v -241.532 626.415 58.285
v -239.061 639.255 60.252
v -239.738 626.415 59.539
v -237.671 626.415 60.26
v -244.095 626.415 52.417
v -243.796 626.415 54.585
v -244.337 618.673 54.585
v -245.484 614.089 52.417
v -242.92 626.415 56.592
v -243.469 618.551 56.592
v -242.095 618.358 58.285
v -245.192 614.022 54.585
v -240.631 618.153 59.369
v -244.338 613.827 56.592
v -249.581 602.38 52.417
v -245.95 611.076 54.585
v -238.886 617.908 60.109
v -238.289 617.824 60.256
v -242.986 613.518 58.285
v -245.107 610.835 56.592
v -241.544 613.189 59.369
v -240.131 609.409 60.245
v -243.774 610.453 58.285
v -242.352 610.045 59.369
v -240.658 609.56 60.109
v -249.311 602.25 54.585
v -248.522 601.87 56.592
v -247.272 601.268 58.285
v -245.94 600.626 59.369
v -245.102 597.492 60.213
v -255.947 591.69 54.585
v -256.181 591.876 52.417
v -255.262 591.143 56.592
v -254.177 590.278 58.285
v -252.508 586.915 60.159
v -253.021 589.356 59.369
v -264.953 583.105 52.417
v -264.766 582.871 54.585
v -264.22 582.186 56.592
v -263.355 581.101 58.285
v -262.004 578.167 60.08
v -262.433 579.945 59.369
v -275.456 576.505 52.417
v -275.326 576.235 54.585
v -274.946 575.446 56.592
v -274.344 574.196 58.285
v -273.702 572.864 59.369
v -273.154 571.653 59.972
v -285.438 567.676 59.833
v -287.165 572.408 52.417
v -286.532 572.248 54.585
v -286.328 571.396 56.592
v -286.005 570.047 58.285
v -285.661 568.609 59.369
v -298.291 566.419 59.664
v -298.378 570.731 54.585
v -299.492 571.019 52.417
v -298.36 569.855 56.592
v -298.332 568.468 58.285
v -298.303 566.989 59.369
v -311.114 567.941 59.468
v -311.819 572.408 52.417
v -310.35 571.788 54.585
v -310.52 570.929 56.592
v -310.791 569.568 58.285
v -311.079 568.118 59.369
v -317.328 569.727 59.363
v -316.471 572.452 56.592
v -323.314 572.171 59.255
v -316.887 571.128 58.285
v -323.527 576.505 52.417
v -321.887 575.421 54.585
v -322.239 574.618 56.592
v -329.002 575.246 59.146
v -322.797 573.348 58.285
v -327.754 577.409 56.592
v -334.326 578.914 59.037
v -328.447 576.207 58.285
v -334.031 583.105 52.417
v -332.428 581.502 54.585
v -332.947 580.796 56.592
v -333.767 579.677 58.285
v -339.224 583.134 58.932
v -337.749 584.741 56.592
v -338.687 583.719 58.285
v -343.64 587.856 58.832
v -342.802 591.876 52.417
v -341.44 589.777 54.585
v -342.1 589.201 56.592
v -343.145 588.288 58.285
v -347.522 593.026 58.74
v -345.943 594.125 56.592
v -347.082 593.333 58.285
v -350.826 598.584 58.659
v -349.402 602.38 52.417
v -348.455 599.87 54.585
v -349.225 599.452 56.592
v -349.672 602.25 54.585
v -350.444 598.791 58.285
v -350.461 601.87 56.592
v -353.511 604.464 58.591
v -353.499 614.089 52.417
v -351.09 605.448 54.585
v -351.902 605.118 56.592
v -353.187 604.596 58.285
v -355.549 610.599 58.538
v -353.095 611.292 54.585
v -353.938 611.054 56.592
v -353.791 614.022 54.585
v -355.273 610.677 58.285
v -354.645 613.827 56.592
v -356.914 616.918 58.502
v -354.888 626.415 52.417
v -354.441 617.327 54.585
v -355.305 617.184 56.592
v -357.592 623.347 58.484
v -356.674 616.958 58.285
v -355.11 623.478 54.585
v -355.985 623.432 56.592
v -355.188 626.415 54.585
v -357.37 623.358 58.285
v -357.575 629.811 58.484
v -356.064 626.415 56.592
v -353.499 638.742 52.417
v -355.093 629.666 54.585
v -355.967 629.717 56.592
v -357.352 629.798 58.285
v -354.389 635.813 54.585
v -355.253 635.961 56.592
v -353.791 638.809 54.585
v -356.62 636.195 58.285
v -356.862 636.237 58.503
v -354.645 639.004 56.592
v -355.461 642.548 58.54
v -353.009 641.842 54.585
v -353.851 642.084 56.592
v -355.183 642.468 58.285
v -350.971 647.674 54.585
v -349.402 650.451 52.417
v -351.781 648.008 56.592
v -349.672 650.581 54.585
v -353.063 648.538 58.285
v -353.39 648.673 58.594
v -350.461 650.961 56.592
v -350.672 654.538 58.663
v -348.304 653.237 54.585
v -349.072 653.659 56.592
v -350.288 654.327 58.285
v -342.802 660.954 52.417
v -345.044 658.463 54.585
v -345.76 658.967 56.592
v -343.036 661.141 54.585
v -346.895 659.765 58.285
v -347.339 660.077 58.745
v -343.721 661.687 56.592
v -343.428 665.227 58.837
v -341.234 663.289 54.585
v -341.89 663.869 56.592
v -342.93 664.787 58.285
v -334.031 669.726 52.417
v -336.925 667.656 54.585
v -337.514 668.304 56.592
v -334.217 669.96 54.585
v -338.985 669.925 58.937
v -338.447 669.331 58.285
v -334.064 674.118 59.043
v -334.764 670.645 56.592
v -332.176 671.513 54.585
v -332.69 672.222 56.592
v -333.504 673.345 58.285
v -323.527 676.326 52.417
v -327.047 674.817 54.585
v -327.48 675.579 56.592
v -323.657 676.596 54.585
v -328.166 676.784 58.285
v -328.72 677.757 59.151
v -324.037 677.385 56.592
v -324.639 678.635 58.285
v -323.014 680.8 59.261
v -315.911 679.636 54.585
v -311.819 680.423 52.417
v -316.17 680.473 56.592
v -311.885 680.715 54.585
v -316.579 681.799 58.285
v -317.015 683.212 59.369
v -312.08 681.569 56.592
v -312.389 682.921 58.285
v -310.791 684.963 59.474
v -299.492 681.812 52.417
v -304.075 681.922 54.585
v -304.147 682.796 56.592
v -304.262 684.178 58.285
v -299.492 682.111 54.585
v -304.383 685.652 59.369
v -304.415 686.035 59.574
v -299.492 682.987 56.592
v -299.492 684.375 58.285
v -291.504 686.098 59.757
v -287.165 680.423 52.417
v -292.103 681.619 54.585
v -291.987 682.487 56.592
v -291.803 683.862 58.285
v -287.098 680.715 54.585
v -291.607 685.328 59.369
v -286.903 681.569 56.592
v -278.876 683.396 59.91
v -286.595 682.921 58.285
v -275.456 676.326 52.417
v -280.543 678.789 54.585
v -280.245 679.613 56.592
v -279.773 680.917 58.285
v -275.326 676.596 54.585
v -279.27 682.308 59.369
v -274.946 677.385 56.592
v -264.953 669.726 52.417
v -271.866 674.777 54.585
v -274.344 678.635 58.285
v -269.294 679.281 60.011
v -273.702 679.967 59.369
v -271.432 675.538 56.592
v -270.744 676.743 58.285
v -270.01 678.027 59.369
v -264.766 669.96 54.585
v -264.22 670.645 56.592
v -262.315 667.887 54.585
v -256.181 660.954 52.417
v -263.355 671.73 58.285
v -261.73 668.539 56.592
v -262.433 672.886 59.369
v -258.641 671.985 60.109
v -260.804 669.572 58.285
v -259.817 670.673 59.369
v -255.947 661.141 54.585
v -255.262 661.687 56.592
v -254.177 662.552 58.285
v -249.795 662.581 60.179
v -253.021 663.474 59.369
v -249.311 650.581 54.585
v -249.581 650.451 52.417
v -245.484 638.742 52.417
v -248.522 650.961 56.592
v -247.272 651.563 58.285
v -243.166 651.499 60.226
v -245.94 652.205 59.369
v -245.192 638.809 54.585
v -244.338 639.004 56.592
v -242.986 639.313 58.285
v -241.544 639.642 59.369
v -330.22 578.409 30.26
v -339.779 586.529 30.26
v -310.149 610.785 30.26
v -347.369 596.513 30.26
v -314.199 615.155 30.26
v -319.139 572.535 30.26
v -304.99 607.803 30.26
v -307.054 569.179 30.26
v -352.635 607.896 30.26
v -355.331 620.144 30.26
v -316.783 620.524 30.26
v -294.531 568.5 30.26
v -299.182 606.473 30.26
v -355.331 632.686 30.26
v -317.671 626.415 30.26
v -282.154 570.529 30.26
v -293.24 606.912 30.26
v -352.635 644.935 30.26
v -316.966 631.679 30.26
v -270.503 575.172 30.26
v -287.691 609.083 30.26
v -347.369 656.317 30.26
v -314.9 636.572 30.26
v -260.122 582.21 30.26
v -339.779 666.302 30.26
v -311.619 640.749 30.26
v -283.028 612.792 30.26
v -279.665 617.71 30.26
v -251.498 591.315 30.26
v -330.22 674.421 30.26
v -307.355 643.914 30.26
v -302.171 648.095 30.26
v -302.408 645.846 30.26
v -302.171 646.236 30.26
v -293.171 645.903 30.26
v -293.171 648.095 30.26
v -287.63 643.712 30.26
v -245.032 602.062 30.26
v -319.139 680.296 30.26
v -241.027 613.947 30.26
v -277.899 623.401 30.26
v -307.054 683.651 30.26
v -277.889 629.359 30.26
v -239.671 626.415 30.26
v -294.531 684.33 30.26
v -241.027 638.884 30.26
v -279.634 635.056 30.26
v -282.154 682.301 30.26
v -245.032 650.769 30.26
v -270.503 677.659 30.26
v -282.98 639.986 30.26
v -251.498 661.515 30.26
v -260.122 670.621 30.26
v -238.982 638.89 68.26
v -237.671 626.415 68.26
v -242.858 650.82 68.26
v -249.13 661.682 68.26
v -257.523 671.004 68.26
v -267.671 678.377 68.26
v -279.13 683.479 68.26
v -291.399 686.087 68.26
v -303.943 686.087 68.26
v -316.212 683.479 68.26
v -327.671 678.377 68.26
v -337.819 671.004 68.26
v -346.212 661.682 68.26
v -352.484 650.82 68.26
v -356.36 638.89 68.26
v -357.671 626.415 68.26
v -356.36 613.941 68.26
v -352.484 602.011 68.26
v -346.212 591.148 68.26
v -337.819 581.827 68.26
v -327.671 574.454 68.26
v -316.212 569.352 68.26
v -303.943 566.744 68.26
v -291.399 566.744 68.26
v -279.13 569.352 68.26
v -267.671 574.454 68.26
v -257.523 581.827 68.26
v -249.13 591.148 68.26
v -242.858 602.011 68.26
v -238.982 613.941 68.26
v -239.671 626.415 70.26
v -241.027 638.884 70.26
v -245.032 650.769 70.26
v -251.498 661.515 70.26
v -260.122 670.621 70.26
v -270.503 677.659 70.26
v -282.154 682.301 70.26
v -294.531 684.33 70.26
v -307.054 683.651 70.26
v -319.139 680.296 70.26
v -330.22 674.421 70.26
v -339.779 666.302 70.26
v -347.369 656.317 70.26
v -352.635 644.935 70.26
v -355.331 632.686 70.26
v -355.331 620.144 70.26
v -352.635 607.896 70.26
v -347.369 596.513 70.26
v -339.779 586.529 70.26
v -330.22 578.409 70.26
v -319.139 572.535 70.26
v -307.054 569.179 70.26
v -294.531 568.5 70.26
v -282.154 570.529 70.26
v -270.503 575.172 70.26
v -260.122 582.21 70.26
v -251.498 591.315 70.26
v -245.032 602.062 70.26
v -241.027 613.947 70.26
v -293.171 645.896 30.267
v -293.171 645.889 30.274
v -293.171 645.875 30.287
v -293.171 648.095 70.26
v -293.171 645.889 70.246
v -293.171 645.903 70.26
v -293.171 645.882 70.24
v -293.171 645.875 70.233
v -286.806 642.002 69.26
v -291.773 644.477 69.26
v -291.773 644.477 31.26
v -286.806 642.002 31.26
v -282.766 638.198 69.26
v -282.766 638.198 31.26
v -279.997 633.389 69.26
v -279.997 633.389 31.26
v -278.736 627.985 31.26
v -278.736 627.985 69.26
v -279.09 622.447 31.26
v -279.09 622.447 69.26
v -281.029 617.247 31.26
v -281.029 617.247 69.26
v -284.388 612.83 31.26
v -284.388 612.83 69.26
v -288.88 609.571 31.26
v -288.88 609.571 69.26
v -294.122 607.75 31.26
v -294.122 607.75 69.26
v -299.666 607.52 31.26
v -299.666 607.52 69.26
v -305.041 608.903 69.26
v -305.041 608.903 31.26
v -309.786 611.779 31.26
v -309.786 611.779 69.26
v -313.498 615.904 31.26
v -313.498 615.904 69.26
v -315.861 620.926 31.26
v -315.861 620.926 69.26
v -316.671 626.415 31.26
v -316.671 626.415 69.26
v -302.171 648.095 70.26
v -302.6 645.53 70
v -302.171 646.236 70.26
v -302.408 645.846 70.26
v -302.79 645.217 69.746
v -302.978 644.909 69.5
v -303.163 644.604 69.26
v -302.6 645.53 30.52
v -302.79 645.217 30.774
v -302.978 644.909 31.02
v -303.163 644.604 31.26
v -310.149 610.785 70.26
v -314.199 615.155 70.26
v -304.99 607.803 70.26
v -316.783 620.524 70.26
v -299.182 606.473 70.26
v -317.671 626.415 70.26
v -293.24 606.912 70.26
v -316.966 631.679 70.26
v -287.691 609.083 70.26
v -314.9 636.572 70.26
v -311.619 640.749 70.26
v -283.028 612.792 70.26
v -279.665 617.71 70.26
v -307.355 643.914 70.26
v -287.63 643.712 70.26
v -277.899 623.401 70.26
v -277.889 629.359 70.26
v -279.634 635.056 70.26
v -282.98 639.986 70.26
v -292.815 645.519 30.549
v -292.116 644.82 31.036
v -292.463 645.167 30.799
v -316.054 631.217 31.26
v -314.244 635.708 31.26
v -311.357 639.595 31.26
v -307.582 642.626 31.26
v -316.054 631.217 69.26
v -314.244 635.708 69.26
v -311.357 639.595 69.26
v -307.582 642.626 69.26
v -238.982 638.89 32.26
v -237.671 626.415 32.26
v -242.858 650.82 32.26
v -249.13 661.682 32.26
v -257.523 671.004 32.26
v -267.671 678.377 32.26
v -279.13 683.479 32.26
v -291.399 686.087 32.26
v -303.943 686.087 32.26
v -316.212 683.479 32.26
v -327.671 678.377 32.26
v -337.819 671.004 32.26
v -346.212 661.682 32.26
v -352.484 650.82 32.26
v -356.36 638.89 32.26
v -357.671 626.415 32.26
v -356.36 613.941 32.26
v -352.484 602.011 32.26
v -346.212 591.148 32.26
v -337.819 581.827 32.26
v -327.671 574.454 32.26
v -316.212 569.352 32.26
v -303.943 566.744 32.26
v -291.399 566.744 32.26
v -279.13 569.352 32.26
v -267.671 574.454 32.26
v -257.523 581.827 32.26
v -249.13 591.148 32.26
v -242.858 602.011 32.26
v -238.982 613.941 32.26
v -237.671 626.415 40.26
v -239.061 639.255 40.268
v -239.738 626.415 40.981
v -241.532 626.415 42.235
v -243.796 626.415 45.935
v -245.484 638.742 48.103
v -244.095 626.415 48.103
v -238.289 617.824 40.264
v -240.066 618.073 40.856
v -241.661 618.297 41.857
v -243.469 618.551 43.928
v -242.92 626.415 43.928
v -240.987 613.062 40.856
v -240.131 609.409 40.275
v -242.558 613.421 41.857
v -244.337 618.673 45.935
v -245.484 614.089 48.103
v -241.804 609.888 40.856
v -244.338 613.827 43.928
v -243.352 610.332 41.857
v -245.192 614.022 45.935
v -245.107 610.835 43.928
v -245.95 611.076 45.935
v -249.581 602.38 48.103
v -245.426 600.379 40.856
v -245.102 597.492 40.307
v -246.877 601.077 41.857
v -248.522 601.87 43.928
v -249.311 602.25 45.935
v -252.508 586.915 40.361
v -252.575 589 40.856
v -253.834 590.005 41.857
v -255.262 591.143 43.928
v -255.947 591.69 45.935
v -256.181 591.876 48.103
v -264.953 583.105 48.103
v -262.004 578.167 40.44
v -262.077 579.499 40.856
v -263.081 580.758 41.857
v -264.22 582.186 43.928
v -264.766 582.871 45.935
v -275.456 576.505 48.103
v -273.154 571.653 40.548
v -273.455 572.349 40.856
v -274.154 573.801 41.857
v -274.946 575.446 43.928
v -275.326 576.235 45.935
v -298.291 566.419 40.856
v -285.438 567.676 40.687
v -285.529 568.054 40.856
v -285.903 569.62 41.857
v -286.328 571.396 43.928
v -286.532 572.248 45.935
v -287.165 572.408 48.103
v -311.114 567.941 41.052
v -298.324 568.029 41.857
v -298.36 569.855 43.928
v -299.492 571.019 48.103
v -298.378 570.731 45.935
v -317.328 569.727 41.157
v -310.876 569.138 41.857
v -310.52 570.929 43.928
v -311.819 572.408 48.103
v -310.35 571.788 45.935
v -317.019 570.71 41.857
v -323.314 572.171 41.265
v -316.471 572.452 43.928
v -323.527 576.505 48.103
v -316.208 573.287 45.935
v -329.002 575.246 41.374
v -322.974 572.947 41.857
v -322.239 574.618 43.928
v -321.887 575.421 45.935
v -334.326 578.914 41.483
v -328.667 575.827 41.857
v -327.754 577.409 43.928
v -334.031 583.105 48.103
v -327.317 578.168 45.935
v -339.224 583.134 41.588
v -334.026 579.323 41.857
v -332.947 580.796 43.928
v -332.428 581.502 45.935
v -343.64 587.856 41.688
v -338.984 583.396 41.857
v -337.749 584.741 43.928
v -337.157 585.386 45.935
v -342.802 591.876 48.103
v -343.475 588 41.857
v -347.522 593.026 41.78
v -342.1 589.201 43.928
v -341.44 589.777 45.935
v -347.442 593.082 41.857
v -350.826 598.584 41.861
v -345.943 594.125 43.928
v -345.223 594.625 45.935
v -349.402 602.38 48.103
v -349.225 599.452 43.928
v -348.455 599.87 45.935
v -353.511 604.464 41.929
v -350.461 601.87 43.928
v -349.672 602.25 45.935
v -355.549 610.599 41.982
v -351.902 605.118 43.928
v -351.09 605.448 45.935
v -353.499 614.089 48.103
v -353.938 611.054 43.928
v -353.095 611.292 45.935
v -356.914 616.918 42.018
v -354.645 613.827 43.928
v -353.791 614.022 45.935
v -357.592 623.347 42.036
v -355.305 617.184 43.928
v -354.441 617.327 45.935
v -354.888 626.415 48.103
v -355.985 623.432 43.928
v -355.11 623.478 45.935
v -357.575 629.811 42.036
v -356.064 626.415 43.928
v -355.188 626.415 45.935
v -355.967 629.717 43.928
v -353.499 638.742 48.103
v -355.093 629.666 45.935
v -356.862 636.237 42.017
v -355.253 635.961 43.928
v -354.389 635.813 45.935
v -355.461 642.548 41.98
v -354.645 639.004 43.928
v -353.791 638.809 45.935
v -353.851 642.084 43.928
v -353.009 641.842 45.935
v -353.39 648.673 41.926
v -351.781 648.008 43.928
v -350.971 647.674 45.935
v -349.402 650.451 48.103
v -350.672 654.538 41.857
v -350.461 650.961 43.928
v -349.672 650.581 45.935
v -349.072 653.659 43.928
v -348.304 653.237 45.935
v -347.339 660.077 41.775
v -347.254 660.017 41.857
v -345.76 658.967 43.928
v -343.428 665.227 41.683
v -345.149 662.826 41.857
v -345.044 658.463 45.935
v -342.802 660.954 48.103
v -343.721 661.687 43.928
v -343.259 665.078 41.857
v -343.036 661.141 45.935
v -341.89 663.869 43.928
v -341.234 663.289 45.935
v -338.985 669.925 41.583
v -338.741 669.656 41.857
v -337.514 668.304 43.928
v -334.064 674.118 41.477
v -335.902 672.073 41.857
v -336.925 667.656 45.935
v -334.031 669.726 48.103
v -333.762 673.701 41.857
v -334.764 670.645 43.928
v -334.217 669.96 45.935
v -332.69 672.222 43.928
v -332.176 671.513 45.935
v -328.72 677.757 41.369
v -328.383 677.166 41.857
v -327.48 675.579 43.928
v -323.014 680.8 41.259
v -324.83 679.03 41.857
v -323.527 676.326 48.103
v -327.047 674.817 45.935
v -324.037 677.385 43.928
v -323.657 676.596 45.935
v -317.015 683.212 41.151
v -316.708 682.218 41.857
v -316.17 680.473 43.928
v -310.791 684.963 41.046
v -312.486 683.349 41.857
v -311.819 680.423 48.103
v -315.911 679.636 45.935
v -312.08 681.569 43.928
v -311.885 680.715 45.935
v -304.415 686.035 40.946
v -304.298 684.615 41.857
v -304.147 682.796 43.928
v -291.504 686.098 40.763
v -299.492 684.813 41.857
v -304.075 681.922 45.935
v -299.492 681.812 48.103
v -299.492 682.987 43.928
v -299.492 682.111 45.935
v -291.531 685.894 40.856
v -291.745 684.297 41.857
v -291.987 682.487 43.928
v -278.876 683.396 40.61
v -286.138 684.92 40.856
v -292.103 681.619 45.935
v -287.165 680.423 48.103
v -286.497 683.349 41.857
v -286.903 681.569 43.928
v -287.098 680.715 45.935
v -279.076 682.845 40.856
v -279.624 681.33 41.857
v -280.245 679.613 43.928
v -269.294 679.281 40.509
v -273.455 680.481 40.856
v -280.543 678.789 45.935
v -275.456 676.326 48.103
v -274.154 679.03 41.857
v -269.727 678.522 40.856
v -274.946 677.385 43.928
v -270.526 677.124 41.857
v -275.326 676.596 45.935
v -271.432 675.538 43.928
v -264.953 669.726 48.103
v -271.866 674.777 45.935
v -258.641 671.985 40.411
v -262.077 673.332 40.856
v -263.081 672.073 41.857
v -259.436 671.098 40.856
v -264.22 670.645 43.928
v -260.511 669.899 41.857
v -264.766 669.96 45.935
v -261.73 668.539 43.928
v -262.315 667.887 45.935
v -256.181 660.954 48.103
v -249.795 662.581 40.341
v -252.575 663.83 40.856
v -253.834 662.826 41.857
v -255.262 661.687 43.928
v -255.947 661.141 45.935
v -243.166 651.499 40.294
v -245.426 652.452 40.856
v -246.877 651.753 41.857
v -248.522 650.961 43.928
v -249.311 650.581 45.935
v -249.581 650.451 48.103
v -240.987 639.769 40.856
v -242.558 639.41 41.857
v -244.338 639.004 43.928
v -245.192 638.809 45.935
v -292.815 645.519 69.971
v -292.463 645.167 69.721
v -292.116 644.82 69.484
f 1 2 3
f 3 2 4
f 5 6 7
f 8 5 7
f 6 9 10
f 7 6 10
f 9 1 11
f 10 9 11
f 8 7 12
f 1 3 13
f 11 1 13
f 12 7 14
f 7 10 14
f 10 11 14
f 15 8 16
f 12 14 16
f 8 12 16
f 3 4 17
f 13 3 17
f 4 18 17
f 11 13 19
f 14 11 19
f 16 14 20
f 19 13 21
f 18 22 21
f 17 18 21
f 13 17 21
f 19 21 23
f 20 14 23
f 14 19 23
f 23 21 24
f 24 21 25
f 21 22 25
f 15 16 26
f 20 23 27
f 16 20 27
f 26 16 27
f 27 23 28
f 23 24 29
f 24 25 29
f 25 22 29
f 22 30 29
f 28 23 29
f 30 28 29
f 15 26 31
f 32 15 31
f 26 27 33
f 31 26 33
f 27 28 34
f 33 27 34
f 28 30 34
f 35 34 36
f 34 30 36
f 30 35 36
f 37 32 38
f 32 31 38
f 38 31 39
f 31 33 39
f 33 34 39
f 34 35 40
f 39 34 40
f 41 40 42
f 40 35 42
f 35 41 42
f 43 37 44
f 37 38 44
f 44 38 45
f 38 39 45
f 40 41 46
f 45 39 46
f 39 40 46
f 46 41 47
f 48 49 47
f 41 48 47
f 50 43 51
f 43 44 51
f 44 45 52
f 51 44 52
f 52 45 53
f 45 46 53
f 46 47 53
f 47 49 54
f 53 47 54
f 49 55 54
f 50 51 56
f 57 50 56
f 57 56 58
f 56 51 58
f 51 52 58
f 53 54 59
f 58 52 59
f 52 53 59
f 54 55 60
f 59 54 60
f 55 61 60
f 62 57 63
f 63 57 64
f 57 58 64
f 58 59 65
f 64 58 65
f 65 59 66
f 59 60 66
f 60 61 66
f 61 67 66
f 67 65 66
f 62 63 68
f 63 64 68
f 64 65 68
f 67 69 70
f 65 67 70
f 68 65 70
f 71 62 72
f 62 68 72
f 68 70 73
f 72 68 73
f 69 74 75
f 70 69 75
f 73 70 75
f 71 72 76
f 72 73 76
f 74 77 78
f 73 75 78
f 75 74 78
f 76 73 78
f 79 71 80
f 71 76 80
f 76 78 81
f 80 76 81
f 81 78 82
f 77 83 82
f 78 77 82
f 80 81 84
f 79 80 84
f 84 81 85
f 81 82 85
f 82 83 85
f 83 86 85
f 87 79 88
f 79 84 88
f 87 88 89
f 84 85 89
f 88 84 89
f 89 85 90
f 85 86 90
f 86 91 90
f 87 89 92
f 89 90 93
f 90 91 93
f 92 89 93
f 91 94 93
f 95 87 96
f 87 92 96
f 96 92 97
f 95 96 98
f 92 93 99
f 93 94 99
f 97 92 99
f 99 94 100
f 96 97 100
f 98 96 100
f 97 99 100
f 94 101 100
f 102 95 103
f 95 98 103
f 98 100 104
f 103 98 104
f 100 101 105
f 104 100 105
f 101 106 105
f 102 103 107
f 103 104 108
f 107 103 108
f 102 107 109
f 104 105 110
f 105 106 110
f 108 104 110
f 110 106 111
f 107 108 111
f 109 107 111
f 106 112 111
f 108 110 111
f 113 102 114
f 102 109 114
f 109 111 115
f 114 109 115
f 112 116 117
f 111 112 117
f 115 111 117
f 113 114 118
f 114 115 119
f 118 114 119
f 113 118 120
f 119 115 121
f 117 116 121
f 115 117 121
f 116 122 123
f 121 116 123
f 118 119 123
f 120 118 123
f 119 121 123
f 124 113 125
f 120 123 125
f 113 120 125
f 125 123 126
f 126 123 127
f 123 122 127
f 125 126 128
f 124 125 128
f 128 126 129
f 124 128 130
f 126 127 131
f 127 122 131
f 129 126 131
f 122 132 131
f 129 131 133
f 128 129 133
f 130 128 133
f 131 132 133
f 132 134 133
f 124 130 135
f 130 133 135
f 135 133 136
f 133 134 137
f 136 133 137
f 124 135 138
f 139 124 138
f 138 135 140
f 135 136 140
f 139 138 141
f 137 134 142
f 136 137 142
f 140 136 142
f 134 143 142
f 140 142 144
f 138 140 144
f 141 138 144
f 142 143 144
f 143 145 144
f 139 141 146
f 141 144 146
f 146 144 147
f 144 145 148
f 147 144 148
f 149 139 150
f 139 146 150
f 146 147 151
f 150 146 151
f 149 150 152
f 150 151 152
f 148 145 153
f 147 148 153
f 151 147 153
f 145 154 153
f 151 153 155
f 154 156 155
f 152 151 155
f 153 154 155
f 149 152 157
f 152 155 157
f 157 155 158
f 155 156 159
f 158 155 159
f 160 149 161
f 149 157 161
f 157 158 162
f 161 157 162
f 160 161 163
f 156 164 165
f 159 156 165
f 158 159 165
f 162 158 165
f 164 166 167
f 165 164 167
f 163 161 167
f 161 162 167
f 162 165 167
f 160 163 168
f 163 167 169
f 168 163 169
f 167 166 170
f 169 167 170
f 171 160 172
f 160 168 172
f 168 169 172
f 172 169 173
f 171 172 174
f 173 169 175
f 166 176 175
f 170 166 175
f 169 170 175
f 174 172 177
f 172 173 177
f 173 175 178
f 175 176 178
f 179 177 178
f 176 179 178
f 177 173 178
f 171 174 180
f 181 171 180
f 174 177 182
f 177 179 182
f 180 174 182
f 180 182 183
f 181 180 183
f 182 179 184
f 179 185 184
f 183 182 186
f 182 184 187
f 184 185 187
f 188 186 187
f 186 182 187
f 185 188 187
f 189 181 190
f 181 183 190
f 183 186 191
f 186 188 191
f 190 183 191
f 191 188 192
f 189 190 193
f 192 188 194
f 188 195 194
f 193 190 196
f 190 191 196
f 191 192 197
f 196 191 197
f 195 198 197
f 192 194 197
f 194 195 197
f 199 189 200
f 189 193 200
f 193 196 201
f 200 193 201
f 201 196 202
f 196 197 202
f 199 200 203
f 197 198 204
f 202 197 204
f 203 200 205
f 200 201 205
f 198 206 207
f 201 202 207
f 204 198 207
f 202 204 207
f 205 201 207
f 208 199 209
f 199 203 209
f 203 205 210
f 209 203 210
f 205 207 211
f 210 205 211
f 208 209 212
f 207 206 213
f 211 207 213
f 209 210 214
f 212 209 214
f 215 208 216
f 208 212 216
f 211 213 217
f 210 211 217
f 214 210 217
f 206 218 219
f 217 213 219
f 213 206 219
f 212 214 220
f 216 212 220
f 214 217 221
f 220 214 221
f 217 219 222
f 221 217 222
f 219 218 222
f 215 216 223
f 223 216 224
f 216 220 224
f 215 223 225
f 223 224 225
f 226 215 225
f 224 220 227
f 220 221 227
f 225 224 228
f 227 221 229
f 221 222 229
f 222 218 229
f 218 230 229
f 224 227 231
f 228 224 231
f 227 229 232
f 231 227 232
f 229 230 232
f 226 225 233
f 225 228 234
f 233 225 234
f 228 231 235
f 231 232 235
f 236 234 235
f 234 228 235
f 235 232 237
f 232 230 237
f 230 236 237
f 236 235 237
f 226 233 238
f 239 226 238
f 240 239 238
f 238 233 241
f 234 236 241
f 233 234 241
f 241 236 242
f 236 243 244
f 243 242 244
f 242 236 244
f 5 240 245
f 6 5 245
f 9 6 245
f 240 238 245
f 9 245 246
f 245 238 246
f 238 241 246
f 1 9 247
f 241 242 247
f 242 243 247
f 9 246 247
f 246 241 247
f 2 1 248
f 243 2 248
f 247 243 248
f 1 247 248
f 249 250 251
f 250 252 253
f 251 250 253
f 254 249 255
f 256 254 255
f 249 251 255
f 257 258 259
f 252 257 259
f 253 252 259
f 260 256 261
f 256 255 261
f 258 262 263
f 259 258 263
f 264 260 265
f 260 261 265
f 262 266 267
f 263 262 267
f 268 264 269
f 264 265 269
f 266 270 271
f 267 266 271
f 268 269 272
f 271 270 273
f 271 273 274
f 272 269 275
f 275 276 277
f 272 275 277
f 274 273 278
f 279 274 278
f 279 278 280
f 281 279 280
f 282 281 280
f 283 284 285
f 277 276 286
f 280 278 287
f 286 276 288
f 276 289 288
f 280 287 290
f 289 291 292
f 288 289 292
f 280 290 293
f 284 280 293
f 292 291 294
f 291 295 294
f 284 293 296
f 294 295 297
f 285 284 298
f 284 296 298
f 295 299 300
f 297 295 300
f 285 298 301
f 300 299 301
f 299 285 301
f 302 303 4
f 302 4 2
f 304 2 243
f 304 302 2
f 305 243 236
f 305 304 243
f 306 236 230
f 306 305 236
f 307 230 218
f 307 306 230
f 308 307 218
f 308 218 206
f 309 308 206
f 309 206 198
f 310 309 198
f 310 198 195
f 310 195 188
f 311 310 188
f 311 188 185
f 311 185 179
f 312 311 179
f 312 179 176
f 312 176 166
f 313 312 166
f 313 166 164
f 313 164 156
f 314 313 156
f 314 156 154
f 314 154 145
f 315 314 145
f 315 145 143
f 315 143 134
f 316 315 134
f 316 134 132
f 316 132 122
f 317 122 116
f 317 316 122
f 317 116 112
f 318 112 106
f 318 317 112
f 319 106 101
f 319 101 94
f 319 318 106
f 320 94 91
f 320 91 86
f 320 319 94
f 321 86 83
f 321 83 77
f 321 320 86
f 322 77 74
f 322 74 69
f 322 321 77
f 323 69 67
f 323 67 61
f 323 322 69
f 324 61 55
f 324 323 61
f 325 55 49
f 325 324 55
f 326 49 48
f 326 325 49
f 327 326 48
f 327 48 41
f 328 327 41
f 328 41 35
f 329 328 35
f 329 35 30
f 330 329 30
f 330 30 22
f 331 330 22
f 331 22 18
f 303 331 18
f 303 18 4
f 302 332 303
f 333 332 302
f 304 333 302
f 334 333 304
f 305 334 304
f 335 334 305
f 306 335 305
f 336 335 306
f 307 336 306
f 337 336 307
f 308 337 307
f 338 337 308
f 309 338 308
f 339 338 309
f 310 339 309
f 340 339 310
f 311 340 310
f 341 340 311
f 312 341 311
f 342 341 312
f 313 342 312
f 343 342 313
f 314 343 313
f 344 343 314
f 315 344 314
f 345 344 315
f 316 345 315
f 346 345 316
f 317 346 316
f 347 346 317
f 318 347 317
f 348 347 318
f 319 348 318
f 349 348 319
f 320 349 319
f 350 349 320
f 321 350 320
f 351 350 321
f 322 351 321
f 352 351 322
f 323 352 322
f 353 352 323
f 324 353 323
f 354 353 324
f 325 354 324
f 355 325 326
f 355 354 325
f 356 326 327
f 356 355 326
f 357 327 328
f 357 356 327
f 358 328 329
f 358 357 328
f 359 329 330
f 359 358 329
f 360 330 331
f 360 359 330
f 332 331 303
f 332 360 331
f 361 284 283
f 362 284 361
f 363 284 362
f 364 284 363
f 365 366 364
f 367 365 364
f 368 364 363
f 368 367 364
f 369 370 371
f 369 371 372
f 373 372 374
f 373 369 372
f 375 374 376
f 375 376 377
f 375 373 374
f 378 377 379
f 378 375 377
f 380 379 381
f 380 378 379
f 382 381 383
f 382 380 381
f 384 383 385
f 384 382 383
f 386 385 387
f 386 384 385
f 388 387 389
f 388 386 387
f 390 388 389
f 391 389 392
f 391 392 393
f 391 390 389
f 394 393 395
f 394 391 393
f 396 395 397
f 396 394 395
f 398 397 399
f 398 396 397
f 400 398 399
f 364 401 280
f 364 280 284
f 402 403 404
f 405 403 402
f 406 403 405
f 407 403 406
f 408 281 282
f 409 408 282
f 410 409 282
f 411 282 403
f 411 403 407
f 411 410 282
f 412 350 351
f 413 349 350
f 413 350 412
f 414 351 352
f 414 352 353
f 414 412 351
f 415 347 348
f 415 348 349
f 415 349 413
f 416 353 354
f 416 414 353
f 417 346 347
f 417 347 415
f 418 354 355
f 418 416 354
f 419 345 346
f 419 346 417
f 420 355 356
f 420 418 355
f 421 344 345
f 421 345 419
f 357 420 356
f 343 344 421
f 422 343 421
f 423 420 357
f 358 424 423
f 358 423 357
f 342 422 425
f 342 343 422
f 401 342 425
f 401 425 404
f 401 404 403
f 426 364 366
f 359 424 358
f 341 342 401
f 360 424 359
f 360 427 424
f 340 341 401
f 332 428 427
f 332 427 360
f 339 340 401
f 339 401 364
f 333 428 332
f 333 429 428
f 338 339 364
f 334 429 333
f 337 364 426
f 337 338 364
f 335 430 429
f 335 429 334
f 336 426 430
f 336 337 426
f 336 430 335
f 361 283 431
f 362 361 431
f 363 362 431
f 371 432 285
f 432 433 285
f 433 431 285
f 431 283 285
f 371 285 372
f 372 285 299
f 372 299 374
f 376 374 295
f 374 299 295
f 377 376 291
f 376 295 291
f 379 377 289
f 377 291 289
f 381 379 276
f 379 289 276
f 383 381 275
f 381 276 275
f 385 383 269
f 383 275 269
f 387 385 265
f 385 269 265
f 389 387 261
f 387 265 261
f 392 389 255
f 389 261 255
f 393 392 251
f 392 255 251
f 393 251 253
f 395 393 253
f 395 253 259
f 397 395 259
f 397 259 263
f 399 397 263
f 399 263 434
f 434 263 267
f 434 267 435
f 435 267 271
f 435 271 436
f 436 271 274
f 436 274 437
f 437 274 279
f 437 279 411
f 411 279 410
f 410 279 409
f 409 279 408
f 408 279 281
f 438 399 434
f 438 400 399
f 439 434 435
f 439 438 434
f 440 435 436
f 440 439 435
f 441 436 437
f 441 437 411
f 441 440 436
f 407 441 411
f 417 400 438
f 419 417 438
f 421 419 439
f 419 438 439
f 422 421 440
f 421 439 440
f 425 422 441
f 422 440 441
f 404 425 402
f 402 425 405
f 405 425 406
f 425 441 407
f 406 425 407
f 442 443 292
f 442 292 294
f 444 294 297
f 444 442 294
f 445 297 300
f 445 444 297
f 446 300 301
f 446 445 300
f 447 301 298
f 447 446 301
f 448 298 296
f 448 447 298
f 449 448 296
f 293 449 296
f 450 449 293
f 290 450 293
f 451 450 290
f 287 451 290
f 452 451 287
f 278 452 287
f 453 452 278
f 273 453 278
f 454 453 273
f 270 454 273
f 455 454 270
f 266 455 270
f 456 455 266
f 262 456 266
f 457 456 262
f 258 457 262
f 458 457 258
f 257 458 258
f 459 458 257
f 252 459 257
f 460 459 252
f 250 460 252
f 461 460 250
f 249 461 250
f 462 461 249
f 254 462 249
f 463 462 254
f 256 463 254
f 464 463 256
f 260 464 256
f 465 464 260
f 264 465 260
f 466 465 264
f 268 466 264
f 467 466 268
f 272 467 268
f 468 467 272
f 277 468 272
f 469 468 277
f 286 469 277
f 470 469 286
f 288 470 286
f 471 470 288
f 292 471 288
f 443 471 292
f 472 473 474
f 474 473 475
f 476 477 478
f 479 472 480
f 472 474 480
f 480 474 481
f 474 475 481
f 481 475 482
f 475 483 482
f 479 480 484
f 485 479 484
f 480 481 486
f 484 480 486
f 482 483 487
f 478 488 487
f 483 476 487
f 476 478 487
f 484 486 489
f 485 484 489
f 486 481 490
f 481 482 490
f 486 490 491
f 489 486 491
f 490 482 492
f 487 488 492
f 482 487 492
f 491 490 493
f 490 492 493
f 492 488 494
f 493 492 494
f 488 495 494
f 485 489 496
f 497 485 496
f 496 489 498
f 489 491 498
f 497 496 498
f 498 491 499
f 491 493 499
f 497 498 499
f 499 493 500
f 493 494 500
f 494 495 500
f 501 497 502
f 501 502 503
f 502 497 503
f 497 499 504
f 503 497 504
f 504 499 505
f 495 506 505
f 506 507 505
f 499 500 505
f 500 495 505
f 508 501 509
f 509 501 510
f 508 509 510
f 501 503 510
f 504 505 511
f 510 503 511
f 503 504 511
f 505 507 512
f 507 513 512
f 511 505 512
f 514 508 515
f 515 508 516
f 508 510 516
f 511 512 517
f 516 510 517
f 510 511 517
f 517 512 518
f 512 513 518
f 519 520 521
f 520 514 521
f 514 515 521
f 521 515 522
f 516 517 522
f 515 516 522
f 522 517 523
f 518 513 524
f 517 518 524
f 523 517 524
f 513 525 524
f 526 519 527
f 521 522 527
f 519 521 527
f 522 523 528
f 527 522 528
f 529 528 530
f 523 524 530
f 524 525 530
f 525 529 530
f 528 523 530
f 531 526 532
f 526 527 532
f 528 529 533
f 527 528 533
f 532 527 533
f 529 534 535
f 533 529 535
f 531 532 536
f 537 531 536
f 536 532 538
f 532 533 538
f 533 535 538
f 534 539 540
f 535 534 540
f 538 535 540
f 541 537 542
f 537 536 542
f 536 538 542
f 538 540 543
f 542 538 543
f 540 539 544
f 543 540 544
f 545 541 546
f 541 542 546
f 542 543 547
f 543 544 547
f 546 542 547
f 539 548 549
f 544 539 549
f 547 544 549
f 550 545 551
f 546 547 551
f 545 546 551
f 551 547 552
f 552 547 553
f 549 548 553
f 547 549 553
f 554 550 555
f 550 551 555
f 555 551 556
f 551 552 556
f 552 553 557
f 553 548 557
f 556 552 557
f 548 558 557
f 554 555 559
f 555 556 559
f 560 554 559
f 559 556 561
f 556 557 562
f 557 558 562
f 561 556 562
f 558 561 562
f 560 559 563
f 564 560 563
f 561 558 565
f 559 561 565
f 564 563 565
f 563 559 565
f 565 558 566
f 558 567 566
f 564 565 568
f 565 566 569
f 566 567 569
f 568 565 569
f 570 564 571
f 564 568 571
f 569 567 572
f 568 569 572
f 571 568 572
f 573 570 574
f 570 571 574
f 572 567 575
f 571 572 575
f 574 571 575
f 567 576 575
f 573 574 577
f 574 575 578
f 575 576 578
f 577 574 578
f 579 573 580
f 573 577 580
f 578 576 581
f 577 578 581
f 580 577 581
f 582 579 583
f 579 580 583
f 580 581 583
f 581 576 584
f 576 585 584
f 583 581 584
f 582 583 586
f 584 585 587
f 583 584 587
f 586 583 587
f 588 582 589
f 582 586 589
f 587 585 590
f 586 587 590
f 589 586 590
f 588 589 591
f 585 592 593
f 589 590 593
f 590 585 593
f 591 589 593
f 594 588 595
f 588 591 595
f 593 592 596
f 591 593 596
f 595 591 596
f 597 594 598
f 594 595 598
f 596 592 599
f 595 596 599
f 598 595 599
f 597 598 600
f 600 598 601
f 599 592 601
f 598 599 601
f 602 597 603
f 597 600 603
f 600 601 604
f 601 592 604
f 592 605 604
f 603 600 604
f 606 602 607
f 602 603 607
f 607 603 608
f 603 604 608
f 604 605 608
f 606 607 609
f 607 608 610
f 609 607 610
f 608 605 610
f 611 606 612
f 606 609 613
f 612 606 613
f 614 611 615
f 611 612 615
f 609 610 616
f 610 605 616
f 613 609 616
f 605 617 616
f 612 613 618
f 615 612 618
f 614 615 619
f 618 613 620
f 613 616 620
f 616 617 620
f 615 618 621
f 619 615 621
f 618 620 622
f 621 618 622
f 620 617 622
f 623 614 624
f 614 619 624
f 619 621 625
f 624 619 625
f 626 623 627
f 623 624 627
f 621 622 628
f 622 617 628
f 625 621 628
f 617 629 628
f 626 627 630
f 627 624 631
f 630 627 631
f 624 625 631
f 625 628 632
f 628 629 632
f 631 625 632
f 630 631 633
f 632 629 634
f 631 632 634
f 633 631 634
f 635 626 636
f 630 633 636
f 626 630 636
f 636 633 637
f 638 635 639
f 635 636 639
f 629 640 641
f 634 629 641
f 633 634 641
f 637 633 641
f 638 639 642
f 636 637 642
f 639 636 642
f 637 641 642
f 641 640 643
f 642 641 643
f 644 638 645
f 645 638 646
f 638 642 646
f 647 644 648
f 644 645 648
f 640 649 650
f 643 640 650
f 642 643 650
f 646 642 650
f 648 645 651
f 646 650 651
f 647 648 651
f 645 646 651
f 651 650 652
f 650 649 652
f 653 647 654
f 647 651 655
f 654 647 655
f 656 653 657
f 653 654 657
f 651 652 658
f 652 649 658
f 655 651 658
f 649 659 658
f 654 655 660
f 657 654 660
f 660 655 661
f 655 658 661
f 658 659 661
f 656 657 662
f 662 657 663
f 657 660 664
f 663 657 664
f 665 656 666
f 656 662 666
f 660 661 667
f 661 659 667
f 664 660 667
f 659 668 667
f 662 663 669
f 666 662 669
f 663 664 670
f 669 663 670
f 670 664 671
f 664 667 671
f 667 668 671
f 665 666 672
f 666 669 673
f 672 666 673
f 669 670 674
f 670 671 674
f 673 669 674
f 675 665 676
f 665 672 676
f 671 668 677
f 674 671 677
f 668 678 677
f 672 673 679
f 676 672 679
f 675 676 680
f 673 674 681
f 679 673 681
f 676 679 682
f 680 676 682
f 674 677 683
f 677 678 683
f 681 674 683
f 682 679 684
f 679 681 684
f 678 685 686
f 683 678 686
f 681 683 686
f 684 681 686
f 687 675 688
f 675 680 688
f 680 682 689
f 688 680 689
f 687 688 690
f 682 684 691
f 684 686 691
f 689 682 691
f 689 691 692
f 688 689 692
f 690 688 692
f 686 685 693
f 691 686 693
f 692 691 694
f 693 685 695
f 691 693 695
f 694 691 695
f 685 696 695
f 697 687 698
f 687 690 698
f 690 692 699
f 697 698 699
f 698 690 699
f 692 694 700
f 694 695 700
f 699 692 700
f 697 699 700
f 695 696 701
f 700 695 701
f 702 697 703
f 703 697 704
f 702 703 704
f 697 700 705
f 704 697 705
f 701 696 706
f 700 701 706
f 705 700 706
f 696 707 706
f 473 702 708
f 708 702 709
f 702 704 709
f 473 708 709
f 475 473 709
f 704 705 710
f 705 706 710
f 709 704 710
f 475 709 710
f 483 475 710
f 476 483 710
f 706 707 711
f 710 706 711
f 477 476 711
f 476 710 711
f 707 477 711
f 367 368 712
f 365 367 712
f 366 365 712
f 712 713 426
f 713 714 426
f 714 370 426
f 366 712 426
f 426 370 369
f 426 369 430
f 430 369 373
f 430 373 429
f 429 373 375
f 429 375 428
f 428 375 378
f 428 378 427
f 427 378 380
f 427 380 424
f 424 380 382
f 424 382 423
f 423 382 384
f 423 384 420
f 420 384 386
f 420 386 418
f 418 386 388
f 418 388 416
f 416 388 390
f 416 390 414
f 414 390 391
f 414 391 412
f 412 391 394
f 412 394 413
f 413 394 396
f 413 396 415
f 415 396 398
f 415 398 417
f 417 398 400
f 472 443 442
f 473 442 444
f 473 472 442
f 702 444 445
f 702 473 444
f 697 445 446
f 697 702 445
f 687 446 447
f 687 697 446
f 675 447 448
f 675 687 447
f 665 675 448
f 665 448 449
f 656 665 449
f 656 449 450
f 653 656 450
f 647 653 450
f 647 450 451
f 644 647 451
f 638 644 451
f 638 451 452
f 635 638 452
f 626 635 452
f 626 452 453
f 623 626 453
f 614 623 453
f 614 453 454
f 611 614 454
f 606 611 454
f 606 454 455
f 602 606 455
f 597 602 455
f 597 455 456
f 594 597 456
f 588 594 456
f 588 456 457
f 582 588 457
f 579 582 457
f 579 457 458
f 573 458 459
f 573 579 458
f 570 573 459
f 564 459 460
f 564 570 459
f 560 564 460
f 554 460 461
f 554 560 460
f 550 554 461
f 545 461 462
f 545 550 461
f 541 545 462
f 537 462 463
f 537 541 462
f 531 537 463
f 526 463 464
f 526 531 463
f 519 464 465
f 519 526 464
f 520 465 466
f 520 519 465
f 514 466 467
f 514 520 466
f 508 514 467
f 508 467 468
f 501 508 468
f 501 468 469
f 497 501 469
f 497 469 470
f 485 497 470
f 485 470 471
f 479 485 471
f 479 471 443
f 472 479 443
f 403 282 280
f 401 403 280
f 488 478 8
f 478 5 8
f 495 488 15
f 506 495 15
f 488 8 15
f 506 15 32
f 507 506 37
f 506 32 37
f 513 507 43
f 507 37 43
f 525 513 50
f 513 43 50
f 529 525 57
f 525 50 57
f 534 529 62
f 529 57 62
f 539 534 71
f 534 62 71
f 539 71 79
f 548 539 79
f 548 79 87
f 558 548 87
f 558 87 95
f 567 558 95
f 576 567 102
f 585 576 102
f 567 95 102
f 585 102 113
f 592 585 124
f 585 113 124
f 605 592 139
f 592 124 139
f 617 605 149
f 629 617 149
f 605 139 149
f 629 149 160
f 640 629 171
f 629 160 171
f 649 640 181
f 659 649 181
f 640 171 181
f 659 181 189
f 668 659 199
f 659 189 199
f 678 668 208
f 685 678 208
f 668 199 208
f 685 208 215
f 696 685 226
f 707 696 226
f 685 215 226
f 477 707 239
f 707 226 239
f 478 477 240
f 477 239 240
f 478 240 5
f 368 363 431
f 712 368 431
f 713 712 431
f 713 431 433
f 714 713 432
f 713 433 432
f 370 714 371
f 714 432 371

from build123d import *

# Parameters (mm, degrees)
SKETCH_1_R               = 60
SKETCH_1_R_2             = 14.438127561
EXTRUDE_1_DEPTH          = 40
CHAMFER_1_SIZE           = 2
SKETCH_5_R               = 25.161734689
EXTRUDE_2_DEPTH          = 40
CUT_EXTRUDE_1_DEPTH      = 776.044855896
CUT_EXTRUDE_1_DEPTH_BACK = 776.044855896
CHAMFER_2_SIZE           = 1.361088561
CHAMFER_2_SIZE_2         = 1


with BuildPart() as part:
    # 草图1 → 凸台-拉伸1 (new body)
    with BuildSketch(Plane.XY.offset(70.26)):
        with Locations((-297.670899951, 626.415366791)):
            Circle(SKETCH_1_R)
        with Locations((-297.670899951, 626.415366791)):
            Circle(SKETCH_1_R_2, mode=Mode.SUBTRACT)
    extrude(amount=-EXTRUDE_1_DEPTH)

    # 草图4 → 切除-旋转1 (revolve, cut)
    with BuildSketch(Plane(origin=(0, 626.415366791, 0), x_dir=(1, 0, 0), z_dir=(0, 1, 0))):
        with BuildLine():
            Line((-244.095308656, -48.103310059), (-244.095308655, -52.416689982))
            ThreePointArc((-244.095308655, -52.416689982), (-242.284199059, -57.48597347), (-237.670899813, -60.259999987))
            Line((-237.670899813, -60.259999987), (-237.670899811, -40.260000013))
            ThreePointArc((-237.670899811, -40.260000013), (-242.284199071, -43.034026546), (-244.095308656, -48.103310059))
        make_face()
    revolve(axis=Axis((-299.491656028, 626.415366791, 70.26), (0, 0, -1)), mode=Mode.SUBTRACT)

    # 倒角1
    chamfer_1_edges = [part.edges().sort_by_distance(p)[0] for p in [
        (-357.670899951, 626.415366791, 70.26),
        (-357.670899951, 626.415366791, 30.26),
    ]]
    chamfer(chamfer_1_edges, length=CHAMFER_1_SIZE)

    # 草图5 → 凸台-拉伸2 (add)
    with BuildSketch(Plane.XY.offset(70.26)):
        with Locations((-297.670899951, 626.415366791)):
            Circle(SKETCH_5_R)
    extrude(amount=-EXTRUDE_2_DEPTH)

    # 草图6 → 切除-拉伸1 (cut, two sides: drawn at the far end of the back side and taken through both)
    with BuildSketch(Plane(origin=(0, 0, 30.26), x_dir=(-1, 0, 0), z_dir=(0, 0, -1)).offset(-CUT_EXTRUDE_1_DEPTH_BACK)):
        with BuildLine():
            ThreePointArc((302.170899951, 644.874781733), (297.670899951, 645.415366791), (293.170899951, 644.874781733))
            Line((293.170899951, 644.874781733), (293.170899951, 626.415366791))
            Line((293.170899951, 626.415366791), (302.170899951, 626.415366791))
            Line((302.170899951, 626.415366791), (302.170899951, 644.874781733))
        make_face()
        with BuildLine():
            Line((293.170899951, 626.415366791), (293.170899951, 644.874781733))
            ThreePointArc((293.170899951, 644.874781733), (285.934205356, 611.473813993), (316.670899951, 626.415366791))
            ThreePointArc((316.670899951, 626.415366791), (312.612452748, 638.152061385), (302.170899951, 644.874781733))
            Line((302.170899951, 644.874781733), (302.170899951, 626.415366791))
            Line((302.170899951, 626.415366791), (293.170899951, 626.415366791))
        make_face()
        with BuildLine():
            Line((302.170899951, 648.095366791), (293.170899951, 648.095366791))
            Line((293.170899951, 648.095366791), (293.170899951, 644.874781733))
            ThreePointArc((293.170899951, 644.874781733), (297.670899951, 645.415366791), (302.170899951, 644.874781733))
            Line((302.170899951, 644.874781733), (302.170899951, 648.095366791))
        make_face()
    extrude(amount=CUT_EXTRUDE_1_DEPTH + CUT_EXTRUDE_1_DEPTH_BACK, mode=Mode.SUBTRACT)

    # 倒角2
    # the kernel refuses this chamfer: 1.361088561, 1 mm, written as the material it takes off along each edge
    with BuildSketch(Plane(origin=(-302.170899951, 644.874781733, 26.740268541), x_dir=(0, 1, 0), z_dir=(0, 0, 1))) as chamfer_2_piece_1:
        with BuildLine():
            Line((CHAMFER_2_SIZE, 0), (-0.270460462, 0.991988248))
            ThreePointArc((-0.270460462, 0.991988248), (-0.133734106, 0.516913582), (0, 0))
            Line((0, 0), (CHAMFER_2_SIZE, 0))
        make_face()
    extrude(amount=47.039462917, mode=Mode.SUBTRACT)
    with BuildSketch(Plane(origin=(-293.170899951, 644.874781733, 26.506479775), x_dir=(0, 1, 0), z_dir=(0, 0, 1))) as chamfer_2_piece_2:
        with BuildLine():
            Line((CHAMFER_2_SIZE_2, 0), (-0.398045781, -1.398045781))
            ThreePointArc((-0.398045781, -1.398045781), (-0.192184694, -0.725734308), (0, 0))
            Line((0, 0), (CHAMFER_2_SIZE_2, 0))
        make_face()
    extrude(amount=47.507040451, mode=Mode.SUBTRACT)
    # the kernel refuses this chamfer: 1.361088561, 1 mm, written as the material it takes off along each edge
    with BuildSketch(Plane(origin=(-297.670899951, 626.415366791, 30.26), x_dir=(0.17889175862136222, 0.9838687609114116, 0), z_dir=(-0.9838687609114116, 0.17889175862136222, 0))) as chamfer_2_2_piece_1:
        Polygon((19, -CHAMFER_2_SIZE_2), (19 + CHAMFER_2_SIZE_2, 0), (19, 0), align=None)
    revolve(axis=Axis((-297.670899951, 626.415366791, 30.26), (0, 0, -1)), revolution_arc=259.694785461, mode=Mode.SUBTRACT)
    with BuildSketch(Plane(origin=(-297.670899951, 626.415366791, 70.26), x_dir=(0.17889175862137457, 0.9838687609114093, 0), z_dir=(-0.9838687609114093, 0.17889175862137457, 0))) as chamfer_2_2_piece_2:
        Polygon((19 + CHAMFER_2_SIZE_2, 0), (19, CHAMFER_2_SIZE_2), (19, 0), align=None)
    revolve(axis=Axis((-297.670899951, 626.415366791, 70.26), (0, 0, -1)), revolution_arc=259.694785461, mode=Mode.SUBTRACT)
    with BuildSketch(Plane(origin=(-297.670899951, 626.415366791, 70.26), x_dir=(-1, 0, 0), z_dir=(0, -1, 0))) as chamfer_2_2_piece_3:
        Polygon((19 + CHAMFER_2_SIZE_2, 0), (19, CHAMFER_2_SIZE_2), (19, 0), align=None)
    revolve(axis=Axis((-297.670899951, 626.415366791, 70.26), (0, 0, -1)), revolution_arc=80.955933819, mode=Mode.SUBTRACT)
    with BuildSketch(Plane(origin=(-297.670899951, 626.415366791, 30.26), x_dir=(-1, 0, 0), z_dir=(0, -1, 0))) as chamfer_2_2_piece_4:
        Polygon((19, -CHAMFER_2_SIZE_2), (19 + CHAMFER_2_SIZE_2, 0), (19, 0), align=None)
    revolve(axis=Axis((-297.670899951, 626.415366791, 30.26), (0, 0, -1)), revolution_arc=80.955933819, mode=Mode.SUBTRACT)


solid = part.part
